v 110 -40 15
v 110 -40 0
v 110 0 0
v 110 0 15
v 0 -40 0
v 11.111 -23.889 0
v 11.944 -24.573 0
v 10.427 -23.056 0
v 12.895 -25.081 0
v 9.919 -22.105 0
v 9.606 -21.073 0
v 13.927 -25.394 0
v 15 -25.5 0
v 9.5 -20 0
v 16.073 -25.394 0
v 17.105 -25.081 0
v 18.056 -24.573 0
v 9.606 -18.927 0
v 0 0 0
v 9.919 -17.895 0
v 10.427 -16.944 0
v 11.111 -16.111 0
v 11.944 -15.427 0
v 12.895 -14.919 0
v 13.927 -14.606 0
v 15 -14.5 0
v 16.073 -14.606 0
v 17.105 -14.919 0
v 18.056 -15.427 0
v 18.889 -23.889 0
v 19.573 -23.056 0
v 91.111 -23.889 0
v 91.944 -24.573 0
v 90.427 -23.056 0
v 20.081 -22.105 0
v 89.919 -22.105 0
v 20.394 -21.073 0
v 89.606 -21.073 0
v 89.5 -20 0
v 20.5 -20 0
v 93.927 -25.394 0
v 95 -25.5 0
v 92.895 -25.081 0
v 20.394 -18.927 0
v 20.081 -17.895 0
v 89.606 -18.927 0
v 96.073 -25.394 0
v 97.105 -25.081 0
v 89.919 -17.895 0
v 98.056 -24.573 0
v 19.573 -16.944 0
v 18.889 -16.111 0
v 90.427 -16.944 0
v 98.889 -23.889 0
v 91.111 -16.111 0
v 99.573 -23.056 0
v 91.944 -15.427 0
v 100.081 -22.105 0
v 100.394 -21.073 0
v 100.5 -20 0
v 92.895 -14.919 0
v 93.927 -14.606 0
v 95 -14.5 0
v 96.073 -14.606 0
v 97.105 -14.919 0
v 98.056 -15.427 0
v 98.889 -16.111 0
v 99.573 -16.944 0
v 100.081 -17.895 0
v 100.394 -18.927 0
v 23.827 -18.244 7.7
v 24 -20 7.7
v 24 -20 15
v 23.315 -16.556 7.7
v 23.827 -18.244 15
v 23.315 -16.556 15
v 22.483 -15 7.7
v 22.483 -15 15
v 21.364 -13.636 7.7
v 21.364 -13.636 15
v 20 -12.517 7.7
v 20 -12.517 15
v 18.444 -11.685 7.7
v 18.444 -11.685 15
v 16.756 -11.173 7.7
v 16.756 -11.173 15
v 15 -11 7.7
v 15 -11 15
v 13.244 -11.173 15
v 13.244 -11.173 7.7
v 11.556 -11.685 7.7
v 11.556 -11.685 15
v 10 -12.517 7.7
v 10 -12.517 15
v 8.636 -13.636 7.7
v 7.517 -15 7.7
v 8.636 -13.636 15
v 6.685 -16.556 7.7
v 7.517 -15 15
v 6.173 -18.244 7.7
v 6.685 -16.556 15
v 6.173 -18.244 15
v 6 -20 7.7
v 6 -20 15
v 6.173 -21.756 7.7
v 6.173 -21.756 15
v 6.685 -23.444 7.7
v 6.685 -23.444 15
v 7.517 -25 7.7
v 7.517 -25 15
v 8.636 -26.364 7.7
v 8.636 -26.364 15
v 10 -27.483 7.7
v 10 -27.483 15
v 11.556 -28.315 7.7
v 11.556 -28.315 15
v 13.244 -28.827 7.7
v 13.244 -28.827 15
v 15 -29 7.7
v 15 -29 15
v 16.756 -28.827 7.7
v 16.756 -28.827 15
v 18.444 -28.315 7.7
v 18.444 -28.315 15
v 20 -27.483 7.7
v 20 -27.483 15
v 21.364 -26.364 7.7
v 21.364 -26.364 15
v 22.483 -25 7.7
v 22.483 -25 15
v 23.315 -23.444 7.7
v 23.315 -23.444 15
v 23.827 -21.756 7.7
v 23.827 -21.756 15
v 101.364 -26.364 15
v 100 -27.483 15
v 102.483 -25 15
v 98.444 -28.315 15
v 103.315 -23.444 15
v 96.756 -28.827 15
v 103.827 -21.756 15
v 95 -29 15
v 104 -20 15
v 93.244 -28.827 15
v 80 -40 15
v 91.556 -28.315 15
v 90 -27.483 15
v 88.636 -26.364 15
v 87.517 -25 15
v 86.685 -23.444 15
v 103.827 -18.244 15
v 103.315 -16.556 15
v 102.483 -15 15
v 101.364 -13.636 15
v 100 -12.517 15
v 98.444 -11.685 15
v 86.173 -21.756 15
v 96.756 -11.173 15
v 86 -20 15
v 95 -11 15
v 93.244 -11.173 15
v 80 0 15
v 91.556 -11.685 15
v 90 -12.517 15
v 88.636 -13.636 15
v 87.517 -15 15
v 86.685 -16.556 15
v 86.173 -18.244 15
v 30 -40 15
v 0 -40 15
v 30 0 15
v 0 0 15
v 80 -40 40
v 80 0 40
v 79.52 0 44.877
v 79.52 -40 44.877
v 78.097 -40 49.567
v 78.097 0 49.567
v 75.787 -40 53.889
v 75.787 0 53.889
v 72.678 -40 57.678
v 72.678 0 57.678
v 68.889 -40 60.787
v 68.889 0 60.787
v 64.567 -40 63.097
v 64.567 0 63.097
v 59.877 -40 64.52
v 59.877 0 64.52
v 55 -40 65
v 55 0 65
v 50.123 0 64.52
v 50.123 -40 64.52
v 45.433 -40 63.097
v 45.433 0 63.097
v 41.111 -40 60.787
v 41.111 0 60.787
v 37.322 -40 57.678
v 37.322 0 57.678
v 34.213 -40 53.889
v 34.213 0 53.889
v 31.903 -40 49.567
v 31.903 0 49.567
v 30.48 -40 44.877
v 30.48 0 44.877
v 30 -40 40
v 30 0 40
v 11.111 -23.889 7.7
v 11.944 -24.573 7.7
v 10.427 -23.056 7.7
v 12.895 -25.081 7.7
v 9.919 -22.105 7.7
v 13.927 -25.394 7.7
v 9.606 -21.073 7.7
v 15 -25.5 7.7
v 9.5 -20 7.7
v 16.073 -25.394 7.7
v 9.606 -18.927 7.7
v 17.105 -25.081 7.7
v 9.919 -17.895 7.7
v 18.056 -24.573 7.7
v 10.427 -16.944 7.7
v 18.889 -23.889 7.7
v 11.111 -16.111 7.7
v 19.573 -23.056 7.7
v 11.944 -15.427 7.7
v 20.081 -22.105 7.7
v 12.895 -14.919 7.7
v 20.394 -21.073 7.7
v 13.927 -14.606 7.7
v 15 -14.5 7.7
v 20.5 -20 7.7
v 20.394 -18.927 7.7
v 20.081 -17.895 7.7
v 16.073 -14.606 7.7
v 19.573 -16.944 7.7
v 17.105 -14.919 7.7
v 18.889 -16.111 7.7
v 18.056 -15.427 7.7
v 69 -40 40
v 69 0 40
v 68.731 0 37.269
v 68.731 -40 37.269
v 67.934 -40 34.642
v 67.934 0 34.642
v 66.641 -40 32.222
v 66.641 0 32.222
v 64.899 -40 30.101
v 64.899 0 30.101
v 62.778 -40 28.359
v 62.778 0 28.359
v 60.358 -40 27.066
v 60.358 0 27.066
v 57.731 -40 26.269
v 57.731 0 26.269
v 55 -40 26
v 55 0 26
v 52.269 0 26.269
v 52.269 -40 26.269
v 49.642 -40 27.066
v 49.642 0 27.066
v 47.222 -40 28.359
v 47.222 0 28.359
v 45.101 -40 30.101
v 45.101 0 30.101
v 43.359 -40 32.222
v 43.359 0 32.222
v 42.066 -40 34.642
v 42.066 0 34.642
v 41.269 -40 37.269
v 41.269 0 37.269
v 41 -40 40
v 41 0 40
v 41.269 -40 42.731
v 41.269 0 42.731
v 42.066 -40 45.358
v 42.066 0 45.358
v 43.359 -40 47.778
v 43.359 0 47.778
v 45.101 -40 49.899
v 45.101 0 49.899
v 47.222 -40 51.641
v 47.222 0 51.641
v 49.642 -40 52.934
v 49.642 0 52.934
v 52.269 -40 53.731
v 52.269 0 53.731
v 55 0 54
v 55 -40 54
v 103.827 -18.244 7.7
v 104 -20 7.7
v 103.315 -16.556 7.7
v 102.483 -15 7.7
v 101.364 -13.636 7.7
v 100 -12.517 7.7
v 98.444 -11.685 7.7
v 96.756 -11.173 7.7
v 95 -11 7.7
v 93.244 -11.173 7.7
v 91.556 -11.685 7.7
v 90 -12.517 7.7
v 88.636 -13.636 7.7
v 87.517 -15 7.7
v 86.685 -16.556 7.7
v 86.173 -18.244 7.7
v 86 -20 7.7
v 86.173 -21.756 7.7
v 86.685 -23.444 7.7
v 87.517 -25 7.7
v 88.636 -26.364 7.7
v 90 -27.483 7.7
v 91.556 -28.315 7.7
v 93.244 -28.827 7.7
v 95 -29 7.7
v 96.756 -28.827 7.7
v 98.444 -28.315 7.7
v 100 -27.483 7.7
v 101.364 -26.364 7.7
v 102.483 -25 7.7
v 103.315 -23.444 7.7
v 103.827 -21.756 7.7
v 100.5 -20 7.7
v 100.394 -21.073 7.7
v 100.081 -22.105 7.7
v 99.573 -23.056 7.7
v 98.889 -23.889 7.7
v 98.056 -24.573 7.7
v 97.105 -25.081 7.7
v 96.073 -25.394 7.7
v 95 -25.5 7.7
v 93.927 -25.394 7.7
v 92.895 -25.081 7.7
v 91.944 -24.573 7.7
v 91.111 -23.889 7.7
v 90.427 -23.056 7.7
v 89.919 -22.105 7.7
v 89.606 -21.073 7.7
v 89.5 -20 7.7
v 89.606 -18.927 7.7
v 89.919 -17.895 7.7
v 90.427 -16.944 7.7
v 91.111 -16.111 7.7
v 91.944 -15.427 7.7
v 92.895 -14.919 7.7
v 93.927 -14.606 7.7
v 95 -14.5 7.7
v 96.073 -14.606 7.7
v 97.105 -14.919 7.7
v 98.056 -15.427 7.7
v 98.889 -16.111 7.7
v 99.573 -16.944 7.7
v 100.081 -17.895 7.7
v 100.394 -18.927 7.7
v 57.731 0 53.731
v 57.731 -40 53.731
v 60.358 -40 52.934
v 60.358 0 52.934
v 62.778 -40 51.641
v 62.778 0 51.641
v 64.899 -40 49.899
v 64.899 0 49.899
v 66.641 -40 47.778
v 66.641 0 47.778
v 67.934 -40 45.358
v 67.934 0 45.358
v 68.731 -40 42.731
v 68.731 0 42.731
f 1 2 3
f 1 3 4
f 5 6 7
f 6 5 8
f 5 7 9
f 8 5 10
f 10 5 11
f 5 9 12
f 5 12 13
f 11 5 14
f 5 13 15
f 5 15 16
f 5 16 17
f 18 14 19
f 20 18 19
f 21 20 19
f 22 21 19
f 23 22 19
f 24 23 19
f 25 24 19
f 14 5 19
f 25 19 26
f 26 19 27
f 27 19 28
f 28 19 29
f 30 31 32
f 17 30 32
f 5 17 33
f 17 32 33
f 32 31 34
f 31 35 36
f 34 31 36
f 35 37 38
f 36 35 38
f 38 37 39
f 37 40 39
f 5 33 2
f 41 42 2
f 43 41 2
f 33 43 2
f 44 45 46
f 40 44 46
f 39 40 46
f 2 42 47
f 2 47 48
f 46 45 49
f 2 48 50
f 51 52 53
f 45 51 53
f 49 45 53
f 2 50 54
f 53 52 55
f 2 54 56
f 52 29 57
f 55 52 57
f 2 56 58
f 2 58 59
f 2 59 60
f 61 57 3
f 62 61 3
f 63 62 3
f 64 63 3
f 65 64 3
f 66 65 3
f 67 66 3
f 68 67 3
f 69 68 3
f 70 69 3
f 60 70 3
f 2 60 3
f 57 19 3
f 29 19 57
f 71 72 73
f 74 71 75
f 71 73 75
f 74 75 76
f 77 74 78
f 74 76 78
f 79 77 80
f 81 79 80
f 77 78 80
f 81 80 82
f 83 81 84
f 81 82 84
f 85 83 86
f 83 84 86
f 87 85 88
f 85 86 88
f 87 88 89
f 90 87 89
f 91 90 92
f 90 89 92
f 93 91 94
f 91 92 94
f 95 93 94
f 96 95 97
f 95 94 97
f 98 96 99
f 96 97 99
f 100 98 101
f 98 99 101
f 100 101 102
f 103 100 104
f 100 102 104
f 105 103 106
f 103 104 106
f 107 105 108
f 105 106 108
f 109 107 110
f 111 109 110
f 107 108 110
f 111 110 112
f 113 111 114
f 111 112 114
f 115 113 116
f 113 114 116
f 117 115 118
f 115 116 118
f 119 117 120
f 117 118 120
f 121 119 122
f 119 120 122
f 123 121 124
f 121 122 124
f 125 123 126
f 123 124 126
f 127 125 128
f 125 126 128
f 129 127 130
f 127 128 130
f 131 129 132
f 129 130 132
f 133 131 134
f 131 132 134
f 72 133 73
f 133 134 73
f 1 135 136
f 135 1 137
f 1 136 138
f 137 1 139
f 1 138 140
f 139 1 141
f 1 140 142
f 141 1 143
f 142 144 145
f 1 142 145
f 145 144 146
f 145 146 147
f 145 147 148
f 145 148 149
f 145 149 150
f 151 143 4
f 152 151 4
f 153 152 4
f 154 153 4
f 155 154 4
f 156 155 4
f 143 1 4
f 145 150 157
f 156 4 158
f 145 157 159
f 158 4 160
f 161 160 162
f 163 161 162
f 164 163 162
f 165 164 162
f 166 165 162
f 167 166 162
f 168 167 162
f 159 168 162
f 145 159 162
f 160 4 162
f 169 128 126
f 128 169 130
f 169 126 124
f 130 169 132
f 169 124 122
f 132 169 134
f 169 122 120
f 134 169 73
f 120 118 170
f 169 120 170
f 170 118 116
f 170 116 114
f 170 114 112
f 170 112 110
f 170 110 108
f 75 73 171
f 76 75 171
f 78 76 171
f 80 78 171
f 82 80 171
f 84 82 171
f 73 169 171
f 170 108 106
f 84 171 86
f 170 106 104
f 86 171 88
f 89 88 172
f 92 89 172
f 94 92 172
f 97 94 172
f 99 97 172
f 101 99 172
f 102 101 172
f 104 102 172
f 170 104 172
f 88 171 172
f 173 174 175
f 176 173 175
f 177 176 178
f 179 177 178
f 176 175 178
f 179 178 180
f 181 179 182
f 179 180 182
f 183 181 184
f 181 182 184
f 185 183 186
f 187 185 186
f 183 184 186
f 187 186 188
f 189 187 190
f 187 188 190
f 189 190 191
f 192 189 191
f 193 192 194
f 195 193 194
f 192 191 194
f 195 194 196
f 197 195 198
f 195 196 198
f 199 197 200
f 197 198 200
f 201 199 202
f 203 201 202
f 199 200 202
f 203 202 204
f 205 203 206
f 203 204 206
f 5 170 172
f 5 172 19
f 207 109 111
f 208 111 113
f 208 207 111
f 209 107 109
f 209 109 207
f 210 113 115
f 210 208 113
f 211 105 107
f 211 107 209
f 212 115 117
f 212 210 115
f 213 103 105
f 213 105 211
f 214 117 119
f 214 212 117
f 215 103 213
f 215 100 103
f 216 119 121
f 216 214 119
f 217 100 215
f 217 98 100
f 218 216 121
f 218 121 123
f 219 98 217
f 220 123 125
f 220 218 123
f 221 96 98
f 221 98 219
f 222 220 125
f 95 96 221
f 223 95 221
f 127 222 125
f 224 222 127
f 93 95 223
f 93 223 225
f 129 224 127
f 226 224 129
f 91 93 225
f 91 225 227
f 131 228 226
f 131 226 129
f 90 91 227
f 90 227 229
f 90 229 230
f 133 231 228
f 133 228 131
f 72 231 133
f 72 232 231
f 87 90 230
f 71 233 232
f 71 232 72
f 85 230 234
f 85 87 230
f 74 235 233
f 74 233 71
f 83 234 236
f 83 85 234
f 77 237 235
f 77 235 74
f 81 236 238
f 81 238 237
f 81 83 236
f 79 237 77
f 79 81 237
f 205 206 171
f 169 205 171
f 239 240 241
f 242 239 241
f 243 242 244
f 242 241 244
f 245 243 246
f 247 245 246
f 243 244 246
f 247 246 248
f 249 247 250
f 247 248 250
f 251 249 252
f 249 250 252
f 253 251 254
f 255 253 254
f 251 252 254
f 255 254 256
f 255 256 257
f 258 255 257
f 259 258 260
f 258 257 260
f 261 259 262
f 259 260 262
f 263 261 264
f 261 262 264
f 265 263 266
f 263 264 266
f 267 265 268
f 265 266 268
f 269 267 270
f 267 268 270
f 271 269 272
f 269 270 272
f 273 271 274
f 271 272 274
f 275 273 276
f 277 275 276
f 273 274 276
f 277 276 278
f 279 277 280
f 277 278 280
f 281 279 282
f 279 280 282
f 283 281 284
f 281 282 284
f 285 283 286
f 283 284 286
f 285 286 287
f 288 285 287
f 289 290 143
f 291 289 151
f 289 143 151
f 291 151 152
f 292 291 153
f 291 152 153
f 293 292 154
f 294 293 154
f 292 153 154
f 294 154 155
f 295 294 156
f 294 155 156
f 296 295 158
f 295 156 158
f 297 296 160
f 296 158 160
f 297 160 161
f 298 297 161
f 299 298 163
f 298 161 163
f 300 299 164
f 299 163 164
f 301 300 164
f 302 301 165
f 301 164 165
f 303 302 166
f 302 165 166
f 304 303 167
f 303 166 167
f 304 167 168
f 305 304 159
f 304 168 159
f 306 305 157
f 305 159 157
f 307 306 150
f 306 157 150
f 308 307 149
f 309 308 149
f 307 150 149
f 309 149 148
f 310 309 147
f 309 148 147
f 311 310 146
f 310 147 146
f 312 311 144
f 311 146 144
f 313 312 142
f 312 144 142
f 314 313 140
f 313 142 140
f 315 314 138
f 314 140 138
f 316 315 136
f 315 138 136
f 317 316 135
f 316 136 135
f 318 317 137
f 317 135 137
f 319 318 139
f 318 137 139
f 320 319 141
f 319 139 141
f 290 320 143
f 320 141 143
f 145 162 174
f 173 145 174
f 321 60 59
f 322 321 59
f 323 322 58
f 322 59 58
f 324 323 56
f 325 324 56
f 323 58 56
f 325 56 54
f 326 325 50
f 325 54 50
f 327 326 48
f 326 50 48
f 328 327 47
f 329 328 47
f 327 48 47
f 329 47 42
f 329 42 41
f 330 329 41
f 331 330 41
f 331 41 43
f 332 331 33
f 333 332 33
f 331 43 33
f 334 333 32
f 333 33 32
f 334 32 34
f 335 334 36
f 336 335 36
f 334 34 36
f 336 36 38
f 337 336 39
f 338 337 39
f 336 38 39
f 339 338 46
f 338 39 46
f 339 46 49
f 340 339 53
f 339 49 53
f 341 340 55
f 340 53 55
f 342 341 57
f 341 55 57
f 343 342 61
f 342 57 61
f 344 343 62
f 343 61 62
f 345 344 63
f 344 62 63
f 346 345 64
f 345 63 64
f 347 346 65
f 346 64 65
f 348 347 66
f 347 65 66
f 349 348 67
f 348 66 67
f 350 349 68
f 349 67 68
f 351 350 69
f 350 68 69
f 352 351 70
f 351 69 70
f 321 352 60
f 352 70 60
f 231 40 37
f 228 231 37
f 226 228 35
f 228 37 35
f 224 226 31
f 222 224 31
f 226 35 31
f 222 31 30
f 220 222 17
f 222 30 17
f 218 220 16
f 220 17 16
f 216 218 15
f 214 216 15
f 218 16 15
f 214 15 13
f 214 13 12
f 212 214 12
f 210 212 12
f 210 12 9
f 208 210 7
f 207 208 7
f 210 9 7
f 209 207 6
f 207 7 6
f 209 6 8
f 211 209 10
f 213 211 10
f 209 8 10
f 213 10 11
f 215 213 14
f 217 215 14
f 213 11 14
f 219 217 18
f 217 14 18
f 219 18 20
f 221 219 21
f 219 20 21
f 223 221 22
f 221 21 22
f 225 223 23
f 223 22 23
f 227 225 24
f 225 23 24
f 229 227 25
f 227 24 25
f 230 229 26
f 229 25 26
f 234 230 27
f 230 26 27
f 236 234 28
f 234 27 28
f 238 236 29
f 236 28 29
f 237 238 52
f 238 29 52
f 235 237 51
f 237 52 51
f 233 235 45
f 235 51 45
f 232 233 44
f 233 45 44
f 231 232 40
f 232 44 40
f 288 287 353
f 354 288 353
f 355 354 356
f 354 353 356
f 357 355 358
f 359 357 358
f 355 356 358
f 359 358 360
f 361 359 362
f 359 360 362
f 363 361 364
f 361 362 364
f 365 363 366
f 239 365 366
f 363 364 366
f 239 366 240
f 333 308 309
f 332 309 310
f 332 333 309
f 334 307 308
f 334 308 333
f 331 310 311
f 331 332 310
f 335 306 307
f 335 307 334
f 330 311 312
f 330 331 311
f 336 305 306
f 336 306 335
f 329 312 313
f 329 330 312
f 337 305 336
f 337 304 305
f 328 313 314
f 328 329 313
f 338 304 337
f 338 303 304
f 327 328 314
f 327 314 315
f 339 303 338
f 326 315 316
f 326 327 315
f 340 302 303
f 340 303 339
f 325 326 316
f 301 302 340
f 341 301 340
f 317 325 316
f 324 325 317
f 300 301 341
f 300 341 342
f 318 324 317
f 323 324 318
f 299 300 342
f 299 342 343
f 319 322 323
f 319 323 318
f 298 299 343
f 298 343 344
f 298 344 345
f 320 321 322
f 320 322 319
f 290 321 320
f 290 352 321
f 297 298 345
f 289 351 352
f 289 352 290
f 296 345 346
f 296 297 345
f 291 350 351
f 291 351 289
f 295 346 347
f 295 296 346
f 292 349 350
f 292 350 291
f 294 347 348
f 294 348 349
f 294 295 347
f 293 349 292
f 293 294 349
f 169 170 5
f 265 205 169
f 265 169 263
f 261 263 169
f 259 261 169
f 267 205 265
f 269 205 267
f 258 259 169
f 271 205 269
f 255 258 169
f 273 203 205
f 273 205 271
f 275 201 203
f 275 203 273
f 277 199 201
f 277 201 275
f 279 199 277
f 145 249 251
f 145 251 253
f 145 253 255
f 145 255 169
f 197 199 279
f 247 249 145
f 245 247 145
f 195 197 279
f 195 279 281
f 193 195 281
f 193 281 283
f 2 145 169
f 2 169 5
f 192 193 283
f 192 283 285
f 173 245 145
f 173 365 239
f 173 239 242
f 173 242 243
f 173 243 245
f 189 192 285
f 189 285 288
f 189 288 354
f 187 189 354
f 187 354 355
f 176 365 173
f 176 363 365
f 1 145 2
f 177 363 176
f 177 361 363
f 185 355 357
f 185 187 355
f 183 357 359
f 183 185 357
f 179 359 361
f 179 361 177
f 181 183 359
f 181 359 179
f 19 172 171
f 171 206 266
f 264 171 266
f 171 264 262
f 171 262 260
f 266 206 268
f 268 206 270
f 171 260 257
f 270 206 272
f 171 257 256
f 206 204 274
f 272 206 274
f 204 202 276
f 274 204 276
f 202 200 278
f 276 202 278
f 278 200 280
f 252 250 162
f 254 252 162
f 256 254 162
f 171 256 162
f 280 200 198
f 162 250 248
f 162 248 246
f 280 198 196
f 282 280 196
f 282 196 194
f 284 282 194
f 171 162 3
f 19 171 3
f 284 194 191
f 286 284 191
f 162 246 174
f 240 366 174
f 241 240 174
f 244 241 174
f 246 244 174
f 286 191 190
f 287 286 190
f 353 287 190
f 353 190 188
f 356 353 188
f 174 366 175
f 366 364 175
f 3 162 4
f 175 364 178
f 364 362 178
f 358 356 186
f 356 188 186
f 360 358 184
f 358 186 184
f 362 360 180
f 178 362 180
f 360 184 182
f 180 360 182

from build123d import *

# Parameters (mm, degrees)
F1_DEPTH = 40
F2_R     = 9
F3_DEPTH = 7.3
F4_R     = 5.5
F5_DEPTH = 7.7
F6_R     = 9
F7_DEPTH = 7.3


with BuildPart() as f1:
    # F0 (on Front) → F1 (new body)
    with BuildSketch(Plane.XZ):
        with BuildLine():
            Line((0, 15), (0, 0))
            Line((0, 0), (55, 0))
            Line((55, 0), (55, 26))
            ThreePointArc((55, 26), (41, 40), (55, 54))
            Line((55, 54), (55, 65))
            ThreePointArc((55, 65), (37.3223304703, 57.6776695297), (30, 40))
            Line((30, 40), (30, 15))
            Line((30, 15), (0, 15))
        make_face()
        with BuildLine():
            Line((55, 26), (55, 0))
            Line((55, 0), (110, 0))
            Line((110, 0), (110, 15))
            Line((110, 15), (80, 15))
            Line((80, 15), (80, 40))
            ThreePointArc((80, 40), (72.6776695297, 57.6776695297), (55, 65))
            Line((55, 65), (55, 54))
            ThreePointArc((55, 54), (64.8994949366, 49.8994949366), (69, 40))
            ThreePointArc((69, 40), (64.8994949366, 30.1005050634), (55, 26))
        make_face()
    extrude(amount=F1_DEPTH)

    # F2 (on face) → F3 (cut)
    with BuildSketch(Plane.XY.offset(15)):
        with Locations((15, -20)):
            Circle(F2_R)
    extrude(amount=-F3_DEPTH, mode=Mode.SUBTRACT)

    # F4 (on face) → F5 (cut)
    with BuildSketch(Plane(origin=(0, 0, 0), x_dir=(1, 0, 0), z_dir=(0, 0, -1))):
        with Locations((15, 20)):
            Circle(F4_R)
        with Locations((95, 20)):
            Circle(F4_R)
    extrude(amount=-F5_DEPTH, mode=Mode.SUBTRACT)

    # F6 (on face) → F7 (cut)
    with BuildSketch(Plane.XY.offset(15)):
        with Locations((95, -20)):
            Circle(F6_R)
    extrude(amount=-F7_DEPTH, mode=Mode.SUBTRACT)


solid = f1.part
